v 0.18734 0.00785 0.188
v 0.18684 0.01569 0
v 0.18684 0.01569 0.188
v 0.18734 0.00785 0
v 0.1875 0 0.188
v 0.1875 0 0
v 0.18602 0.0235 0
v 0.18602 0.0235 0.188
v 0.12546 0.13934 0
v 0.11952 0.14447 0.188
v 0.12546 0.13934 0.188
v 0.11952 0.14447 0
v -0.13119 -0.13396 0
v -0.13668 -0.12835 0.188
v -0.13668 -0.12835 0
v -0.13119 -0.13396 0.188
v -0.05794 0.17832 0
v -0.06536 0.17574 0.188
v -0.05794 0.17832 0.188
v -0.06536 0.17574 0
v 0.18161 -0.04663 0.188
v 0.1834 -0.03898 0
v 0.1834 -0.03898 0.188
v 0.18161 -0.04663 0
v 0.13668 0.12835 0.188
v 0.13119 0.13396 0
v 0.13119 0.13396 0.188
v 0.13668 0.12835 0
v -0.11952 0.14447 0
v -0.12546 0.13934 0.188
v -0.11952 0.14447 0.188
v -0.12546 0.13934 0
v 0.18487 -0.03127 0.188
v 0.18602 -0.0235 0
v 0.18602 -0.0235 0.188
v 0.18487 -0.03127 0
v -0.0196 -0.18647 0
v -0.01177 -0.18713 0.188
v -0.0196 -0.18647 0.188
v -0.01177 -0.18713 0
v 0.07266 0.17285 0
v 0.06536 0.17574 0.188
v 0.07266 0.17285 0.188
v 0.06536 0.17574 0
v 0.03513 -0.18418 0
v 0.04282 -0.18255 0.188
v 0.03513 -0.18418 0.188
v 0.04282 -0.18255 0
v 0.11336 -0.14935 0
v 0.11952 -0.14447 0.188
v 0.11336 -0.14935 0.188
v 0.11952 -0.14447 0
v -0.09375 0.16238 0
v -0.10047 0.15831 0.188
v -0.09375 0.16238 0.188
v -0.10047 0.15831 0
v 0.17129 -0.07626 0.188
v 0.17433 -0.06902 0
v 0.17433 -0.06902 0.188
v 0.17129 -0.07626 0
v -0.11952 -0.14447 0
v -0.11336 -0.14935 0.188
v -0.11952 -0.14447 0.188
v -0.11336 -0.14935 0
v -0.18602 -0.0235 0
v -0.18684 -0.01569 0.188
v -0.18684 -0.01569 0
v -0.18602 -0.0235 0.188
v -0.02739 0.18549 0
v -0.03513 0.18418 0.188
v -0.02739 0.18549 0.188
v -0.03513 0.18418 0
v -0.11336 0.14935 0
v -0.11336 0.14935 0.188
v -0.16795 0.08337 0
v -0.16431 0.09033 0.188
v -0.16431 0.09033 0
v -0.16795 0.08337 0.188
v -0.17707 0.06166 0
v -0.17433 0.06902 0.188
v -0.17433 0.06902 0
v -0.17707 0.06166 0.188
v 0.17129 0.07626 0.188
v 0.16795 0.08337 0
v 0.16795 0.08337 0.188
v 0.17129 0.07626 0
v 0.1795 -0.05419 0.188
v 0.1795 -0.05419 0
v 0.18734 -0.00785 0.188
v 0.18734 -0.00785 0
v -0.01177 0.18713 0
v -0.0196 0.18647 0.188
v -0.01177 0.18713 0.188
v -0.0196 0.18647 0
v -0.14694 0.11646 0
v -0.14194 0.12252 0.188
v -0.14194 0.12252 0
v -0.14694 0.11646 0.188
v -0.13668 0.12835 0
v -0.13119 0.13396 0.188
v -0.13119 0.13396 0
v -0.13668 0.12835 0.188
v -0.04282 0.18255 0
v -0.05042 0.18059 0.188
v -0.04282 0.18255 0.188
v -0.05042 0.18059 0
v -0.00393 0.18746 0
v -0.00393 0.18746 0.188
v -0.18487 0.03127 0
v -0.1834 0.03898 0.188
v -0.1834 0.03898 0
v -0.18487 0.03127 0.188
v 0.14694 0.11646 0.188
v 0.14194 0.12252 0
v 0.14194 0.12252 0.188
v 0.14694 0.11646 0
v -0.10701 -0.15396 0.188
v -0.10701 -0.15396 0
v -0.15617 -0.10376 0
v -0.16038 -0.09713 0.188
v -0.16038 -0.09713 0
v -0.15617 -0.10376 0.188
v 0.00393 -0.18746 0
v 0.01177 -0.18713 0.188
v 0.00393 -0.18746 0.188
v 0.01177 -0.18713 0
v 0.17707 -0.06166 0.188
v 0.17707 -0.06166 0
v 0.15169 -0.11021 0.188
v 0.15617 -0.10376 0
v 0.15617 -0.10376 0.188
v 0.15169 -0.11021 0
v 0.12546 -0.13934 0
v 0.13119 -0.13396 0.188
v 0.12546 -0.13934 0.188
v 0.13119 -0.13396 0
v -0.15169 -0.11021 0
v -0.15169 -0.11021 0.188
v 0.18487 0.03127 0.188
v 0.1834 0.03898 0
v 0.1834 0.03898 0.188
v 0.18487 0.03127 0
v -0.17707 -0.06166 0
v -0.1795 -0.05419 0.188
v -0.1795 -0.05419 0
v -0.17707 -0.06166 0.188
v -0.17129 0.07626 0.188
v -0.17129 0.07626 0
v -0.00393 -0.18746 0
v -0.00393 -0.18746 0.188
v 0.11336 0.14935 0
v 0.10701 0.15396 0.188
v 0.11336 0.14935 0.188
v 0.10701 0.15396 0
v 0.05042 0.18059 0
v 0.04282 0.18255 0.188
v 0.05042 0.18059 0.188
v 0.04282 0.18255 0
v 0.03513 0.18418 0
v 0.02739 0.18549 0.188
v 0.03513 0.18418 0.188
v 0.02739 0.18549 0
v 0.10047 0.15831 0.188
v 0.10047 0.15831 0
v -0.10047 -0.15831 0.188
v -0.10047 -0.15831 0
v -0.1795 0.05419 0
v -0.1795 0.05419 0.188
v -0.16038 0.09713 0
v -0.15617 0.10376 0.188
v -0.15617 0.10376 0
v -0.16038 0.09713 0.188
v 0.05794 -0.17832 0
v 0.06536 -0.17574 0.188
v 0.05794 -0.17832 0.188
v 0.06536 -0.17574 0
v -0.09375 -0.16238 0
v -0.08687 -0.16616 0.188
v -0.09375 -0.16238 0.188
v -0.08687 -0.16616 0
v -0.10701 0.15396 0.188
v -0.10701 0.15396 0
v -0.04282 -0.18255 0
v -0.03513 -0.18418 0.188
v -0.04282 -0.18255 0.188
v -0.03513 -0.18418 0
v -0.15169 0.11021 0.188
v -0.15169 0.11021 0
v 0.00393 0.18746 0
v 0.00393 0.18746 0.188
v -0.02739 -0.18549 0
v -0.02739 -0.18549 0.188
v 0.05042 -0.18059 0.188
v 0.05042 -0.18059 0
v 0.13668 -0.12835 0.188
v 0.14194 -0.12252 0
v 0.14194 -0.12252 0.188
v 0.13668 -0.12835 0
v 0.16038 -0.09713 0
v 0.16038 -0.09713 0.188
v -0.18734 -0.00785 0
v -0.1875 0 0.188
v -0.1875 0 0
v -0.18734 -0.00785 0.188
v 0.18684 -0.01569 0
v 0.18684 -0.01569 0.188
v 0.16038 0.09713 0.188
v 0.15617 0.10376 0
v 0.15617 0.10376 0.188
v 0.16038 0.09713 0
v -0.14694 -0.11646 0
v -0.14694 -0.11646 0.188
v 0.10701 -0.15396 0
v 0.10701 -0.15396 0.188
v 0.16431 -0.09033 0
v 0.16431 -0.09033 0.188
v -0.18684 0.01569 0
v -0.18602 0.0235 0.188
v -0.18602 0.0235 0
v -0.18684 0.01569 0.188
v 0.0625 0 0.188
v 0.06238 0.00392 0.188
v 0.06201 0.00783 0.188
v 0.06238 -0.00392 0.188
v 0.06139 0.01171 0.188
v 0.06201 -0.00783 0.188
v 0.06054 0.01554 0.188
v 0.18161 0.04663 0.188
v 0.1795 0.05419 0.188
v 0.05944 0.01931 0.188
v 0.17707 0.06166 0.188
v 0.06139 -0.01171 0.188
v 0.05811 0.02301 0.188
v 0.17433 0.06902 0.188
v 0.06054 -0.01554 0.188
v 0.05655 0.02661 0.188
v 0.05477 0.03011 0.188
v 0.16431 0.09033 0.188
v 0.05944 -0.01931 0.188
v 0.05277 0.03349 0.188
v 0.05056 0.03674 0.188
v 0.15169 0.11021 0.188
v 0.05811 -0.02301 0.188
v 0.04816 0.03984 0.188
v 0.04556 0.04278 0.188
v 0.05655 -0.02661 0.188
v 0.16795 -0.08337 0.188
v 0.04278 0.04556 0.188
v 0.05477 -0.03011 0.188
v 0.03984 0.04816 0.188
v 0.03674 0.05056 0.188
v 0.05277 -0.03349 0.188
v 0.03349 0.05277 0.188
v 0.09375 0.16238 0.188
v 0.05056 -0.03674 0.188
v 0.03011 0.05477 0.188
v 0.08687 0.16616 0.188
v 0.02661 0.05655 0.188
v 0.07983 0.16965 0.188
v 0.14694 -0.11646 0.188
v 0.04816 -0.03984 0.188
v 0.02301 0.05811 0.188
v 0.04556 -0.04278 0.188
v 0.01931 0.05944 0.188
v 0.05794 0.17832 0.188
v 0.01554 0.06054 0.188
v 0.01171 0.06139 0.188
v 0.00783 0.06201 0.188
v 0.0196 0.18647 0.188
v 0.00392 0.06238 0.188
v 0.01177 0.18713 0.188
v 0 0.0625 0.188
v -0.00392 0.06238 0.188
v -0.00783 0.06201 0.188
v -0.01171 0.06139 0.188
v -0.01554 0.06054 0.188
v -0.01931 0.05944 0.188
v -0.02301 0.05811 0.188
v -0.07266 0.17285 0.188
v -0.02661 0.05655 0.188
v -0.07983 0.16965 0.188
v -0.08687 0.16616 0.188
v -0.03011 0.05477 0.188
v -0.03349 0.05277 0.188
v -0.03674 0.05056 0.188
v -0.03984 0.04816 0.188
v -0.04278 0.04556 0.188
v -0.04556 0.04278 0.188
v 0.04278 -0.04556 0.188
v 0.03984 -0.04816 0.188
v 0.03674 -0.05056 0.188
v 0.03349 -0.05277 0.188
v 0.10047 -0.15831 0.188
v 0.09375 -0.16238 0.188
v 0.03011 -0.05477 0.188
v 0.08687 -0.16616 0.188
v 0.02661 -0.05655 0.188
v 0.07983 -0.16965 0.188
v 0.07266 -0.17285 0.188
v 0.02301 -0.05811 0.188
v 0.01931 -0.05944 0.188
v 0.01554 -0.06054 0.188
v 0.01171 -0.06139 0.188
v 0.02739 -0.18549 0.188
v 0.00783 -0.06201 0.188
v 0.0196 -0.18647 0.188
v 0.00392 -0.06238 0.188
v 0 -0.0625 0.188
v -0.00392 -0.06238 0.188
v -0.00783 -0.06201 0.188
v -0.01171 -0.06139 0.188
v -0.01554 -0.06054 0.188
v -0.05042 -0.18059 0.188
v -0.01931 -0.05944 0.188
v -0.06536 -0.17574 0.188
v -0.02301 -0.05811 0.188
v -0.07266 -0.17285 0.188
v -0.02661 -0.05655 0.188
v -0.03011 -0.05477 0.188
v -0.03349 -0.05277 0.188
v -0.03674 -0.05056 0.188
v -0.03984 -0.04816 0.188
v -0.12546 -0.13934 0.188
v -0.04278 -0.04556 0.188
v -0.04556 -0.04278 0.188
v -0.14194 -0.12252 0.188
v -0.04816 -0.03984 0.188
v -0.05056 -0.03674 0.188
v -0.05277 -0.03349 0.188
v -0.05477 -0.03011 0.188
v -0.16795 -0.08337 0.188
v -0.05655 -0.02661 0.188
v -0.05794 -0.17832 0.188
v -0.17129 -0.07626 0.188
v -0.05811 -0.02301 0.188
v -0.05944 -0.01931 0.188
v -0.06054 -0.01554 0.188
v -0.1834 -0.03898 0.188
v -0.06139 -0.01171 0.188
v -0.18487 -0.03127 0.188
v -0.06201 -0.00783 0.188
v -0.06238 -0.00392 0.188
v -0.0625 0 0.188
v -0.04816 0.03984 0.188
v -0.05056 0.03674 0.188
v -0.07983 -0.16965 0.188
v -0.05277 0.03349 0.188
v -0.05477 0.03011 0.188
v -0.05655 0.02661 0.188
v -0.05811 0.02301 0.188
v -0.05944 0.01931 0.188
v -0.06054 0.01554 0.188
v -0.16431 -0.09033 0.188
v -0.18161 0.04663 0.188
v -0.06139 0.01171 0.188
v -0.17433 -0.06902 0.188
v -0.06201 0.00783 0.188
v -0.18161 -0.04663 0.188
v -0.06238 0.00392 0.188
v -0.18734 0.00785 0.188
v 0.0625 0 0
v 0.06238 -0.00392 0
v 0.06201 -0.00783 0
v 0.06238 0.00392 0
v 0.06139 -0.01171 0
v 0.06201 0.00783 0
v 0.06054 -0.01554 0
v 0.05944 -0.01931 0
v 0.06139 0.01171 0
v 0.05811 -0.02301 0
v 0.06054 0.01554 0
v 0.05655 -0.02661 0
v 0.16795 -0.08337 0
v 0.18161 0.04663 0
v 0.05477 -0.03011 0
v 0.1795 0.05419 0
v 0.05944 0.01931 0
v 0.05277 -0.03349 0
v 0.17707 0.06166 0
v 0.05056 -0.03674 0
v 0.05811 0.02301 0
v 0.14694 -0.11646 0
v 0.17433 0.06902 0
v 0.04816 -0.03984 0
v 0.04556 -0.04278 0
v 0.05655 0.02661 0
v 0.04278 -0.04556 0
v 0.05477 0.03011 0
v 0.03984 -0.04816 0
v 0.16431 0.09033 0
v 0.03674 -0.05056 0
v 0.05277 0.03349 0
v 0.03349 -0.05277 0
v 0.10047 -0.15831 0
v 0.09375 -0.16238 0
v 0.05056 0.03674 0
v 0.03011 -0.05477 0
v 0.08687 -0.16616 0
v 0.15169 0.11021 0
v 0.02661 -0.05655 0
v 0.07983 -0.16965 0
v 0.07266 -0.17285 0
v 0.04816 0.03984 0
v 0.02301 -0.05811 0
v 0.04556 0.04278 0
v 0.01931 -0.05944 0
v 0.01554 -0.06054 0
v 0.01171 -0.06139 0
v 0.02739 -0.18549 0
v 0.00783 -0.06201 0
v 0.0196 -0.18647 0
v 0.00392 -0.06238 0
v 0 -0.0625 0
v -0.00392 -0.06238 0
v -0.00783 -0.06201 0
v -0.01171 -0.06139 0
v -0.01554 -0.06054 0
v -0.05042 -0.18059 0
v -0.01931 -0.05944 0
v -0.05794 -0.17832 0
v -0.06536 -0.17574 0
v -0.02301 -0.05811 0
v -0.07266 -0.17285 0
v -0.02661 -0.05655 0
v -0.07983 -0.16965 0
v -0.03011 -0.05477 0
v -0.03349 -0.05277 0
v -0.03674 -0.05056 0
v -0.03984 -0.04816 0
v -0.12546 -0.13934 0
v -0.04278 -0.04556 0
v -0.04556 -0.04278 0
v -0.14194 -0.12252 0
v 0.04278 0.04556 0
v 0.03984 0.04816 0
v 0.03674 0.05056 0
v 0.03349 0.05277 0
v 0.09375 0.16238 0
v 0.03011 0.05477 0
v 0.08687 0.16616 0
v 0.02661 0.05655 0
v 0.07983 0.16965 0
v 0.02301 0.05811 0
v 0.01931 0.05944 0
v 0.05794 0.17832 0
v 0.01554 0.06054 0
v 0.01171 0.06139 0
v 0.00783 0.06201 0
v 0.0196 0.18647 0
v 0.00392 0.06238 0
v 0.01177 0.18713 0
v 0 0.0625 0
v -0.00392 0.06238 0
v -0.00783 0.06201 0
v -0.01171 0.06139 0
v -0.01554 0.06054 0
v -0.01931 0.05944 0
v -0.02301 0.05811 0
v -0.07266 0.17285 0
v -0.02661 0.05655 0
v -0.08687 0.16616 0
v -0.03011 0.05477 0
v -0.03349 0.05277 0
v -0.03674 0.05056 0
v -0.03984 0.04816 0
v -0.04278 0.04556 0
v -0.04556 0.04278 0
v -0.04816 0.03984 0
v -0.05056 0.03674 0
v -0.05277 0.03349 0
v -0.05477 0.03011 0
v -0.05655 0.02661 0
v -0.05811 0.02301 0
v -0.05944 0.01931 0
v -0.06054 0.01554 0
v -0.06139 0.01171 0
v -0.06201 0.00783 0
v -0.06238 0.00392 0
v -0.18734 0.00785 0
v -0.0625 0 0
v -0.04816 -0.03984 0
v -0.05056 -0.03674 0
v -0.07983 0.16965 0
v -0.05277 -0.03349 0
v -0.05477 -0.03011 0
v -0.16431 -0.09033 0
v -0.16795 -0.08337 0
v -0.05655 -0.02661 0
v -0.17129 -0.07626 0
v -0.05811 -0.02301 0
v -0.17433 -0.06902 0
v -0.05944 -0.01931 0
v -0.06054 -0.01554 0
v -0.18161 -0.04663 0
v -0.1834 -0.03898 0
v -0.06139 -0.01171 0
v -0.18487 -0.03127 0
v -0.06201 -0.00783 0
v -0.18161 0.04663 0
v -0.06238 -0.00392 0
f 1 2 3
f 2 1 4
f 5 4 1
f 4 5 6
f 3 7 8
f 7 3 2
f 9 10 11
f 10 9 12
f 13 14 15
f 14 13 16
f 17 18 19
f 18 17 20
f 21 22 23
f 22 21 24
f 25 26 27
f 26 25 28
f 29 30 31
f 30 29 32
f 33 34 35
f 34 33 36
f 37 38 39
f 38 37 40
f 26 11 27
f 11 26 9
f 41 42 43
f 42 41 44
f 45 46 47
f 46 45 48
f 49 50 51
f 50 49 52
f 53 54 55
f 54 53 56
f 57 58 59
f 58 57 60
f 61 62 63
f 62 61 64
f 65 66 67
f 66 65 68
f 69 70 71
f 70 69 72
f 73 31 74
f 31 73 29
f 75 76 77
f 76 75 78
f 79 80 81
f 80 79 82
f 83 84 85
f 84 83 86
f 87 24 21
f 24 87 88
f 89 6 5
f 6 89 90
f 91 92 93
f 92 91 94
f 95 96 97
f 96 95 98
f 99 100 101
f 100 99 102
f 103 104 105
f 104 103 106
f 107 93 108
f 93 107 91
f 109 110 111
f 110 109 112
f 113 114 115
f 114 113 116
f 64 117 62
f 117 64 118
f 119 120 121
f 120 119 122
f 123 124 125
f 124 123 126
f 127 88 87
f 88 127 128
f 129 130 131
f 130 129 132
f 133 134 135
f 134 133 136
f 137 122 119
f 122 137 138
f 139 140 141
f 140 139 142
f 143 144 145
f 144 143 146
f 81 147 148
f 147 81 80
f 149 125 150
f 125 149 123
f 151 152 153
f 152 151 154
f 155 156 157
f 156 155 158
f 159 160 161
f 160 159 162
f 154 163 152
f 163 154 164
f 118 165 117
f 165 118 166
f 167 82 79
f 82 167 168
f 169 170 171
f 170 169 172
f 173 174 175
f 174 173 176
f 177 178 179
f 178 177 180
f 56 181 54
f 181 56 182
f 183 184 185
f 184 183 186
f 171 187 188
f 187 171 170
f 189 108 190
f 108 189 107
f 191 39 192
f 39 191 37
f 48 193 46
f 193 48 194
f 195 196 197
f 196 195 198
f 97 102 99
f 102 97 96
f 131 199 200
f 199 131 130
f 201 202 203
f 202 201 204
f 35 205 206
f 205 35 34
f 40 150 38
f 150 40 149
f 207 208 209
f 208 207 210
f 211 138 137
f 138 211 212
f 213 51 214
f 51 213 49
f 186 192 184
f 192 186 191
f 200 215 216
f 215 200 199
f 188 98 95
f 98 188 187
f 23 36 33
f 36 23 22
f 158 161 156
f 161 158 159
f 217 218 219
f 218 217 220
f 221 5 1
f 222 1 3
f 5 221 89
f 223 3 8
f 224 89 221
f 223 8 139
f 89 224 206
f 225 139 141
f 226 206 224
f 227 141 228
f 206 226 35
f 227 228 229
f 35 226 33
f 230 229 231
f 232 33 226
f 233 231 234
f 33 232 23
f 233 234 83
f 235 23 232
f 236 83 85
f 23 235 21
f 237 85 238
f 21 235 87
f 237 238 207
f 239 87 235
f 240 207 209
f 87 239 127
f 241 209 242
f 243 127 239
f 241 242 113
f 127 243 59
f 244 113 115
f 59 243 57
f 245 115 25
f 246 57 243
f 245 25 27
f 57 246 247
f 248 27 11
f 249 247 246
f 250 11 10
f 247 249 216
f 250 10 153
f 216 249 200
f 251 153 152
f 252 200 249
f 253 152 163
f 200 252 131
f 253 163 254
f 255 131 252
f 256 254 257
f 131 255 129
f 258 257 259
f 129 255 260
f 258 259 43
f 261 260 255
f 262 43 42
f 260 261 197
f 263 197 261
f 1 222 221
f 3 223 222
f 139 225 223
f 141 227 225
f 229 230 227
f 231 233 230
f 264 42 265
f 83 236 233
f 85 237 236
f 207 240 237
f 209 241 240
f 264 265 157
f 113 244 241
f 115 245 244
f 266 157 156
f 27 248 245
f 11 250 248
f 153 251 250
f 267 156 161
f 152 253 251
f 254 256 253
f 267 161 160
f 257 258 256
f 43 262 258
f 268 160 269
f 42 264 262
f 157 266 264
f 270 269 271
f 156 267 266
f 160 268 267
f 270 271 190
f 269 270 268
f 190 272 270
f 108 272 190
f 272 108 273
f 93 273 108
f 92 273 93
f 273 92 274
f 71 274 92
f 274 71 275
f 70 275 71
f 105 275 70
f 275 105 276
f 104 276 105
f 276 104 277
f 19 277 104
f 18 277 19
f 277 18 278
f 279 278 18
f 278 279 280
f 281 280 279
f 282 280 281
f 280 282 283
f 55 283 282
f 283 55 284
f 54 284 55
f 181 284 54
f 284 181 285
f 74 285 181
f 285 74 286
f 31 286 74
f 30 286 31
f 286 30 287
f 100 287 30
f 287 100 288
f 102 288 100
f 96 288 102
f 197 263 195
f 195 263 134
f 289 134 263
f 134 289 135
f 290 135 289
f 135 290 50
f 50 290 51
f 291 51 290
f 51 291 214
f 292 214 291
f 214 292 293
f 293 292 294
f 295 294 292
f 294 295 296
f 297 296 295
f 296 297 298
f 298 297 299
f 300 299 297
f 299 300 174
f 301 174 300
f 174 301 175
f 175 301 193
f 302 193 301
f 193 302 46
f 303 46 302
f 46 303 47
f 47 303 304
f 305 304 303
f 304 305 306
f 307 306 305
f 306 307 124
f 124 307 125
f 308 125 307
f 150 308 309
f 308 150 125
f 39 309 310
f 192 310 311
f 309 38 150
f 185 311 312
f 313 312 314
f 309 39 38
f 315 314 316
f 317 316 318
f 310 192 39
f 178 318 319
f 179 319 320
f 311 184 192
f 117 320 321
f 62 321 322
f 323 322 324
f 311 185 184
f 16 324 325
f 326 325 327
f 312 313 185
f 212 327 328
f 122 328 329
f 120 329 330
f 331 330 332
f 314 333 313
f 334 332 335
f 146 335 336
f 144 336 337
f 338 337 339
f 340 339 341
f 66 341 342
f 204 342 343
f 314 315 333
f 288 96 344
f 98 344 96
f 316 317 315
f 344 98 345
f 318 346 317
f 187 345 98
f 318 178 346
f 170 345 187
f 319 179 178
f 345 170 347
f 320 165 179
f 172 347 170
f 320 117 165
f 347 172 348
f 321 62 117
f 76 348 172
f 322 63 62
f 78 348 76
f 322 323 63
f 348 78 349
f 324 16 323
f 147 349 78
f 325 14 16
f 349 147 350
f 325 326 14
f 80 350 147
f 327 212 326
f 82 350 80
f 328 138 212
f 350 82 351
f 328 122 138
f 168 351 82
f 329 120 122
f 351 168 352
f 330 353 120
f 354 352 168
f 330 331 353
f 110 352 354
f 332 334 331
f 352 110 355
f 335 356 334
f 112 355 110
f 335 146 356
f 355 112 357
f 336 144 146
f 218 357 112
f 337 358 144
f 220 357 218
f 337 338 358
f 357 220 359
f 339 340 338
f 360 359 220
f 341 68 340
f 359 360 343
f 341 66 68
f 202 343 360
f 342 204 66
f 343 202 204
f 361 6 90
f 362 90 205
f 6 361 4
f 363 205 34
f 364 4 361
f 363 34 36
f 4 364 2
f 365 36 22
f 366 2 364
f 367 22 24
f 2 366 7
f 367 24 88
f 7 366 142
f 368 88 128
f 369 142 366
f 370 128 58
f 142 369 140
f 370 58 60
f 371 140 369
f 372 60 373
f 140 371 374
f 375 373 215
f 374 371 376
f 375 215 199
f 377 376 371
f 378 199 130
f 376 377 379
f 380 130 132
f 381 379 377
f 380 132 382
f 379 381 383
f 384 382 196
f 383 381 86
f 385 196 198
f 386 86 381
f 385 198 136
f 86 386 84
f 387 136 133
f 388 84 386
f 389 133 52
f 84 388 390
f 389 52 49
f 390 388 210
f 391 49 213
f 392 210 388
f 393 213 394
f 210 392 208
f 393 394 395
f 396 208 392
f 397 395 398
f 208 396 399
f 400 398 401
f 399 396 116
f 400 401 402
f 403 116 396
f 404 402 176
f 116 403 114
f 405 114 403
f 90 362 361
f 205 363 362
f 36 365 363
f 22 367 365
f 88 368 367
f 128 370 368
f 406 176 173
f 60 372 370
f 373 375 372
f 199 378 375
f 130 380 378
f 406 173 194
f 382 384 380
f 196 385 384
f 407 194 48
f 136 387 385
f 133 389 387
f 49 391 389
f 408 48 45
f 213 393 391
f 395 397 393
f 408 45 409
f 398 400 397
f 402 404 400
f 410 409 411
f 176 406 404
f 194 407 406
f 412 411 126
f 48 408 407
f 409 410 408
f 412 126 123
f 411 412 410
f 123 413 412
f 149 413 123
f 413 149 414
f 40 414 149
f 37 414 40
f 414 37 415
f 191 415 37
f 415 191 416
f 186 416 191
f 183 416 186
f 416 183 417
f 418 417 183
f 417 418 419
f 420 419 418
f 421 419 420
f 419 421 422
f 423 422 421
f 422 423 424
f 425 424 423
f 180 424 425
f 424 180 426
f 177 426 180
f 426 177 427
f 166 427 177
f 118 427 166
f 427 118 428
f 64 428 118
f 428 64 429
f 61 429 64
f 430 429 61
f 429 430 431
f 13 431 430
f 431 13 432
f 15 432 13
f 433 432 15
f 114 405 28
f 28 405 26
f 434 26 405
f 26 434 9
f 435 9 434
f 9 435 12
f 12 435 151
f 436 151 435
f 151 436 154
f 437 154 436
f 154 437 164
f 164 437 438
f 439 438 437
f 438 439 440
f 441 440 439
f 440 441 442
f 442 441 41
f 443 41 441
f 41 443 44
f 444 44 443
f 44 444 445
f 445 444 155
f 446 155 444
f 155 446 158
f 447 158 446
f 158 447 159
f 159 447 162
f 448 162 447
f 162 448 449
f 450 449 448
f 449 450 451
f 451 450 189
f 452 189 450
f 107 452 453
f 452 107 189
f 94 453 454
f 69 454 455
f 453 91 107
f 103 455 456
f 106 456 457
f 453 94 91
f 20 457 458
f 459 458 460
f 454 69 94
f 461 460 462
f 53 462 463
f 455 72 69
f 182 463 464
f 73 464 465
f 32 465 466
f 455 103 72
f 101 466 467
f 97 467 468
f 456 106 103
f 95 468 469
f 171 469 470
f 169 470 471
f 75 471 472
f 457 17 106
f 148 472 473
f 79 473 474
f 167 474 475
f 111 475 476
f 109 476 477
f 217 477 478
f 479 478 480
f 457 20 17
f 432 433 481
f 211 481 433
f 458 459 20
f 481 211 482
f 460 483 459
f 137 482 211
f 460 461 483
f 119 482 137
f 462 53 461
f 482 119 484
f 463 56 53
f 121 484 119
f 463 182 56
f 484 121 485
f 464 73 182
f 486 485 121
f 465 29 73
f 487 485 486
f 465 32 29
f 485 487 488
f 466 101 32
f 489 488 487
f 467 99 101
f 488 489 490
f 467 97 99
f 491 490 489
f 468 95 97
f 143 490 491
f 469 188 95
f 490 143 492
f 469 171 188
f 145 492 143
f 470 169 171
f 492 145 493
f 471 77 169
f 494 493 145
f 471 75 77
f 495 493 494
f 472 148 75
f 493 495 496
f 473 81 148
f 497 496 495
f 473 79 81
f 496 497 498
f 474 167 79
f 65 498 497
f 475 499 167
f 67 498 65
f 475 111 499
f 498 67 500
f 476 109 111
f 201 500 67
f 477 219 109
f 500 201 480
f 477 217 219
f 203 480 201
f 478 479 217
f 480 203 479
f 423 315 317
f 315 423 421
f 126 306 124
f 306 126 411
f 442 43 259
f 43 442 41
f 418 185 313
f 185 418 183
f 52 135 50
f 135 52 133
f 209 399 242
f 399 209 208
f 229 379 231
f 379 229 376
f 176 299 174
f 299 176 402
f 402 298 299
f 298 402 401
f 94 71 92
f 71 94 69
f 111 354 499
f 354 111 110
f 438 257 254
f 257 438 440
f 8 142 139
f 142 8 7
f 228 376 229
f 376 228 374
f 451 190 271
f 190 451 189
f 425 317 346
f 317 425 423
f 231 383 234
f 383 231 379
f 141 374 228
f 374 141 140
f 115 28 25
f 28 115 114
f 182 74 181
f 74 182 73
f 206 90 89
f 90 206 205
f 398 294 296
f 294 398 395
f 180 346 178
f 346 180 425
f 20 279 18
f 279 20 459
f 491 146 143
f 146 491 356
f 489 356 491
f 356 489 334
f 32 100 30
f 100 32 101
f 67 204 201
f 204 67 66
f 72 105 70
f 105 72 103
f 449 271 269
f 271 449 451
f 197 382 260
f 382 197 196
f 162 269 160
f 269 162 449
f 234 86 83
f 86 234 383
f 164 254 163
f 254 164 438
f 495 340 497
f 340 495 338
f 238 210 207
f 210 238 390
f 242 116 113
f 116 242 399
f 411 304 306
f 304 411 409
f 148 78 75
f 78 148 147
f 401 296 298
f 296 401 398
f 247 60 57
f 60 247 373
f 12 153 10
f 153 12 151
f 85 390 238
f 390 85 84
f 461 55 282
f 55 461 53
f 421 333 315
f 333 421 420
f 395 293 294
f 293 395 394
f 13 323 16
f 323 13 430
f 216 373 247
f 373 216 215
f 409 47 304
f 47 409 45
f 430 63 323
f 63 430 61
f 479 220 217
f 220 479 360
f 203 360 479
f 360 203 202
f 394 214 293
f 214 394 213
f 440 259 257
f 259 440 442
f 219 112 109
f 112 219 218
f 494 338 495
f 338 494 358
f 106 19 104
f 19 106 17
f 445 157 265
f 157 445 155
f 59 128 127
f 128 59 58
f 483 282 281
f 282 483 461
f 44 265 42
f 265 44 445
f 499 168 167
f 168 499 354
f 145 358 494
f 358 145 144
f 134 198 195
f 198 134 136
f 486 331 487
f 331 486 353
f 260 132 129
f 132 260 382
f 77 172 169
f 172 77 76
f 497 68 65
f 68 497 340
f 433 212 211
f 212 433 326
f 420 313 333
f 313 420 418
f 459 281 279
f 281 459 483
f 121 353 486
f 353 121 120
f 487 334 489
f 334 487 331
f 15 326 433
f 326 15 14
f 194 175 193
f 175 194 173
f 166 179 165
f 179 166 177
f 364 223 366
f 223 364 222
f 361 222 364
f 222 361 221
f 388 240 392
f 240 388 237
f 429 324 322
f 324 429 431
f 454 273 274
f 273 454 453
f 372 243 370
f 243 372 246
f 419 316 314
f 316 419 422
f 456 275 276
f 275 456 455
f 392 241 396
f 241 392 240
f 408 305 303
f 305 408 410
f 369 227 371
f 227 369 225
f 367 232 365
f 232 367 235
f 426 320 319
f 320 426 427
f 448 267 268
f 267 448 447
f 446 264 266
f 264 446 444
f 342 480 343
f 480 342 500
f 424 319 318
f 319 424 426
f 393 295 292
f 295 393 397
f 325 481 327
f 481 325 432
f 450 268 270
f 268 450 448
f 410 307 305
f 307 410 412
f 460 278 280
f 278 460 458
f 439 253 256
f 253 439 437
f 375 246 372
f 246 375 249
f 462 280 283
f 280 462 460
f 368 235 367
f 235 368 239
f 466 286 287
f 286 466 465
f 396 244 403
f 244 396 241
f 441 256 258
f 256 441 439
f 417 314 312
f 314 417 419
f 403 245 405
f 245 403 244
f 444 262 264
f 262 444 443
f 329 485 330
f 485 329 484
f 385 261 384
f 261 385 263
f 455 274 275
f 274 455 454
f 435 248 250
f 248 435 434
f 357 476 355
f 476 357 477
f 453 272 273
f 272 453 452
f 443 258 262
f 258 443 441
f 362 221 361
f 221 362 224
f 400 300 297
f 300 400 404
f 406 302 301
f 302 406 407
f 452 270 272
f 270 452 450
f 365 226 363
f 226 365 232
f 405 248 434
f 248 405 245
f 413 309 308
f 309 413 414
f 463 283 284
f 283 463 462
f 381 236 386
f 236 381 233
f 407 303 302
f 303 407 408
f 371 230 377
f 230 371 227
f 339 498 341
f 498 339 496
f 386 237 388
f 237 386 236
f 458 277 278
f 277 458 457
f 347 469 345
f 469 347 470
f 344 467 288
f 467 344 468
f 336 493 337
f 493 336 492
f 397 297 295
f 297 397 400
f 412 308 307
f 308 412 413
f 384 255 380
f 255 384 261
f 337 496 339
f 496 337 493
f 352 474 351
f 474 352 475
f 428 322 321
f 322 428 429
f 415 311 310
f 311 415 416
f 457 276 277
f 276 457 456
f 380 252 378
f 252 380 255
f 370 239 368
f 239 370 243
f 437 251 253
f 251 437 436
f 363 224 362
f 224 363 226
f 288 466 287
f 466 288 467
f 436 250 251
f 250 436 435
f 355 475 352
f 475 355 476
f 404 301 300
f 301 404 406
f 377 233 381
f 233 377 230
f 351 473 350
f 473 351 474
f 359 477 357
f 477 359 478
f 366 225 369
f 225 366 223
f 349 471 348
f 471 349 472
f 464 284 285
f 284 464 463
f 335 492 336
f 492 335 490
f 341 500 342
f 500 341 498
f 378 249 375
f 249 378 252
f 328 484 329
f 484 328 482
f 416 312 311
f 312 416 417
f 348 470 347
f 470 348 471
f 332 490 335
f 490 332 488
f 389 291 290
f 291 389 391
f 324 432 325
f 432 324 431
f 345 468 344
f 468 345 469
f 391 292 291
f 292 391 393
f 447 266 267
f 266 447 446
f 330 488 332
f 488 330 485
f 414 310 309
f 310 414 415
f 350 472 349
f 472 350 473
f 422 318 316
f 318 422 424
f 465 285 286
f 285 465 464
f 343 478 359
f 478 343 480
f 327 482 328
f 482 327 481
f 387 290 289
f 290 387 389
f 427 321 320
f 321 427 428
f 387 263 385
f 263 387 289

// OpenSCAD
// Gear16
//
// Tooth spacing 2.500 mm
// Contact angle 20 degrees
// Addendum 0.250 mm
// Diametric pitch 1.257 1/mm
// Pitch diameter 12.732 mm
// Overall diameter 13.83 mm
// Shaft spacing 19.099 mm (to 32 tooth gear)

drawingPositionIN = 40/25.4;

difference() {
  union () {
    // Gear body
    translate([-drawingPositionIN, -drawingPositionIN, 0])
      linear_extrude(height = 0.125, center = false, convexity = 25, slices = 5)
                     import(file = "Gears32and16.dxf", scale = 1/25.4, layer="Gear16");

    // Gear hub
    translate([0, 0, 0])
      cylinder(h = 0.188, d = 0.375, center = false, $fn = 150);
  }

  // idle bar hole
  cylinder(h = 2.0, d = 0.125, center = true, $fn = 100);
}
